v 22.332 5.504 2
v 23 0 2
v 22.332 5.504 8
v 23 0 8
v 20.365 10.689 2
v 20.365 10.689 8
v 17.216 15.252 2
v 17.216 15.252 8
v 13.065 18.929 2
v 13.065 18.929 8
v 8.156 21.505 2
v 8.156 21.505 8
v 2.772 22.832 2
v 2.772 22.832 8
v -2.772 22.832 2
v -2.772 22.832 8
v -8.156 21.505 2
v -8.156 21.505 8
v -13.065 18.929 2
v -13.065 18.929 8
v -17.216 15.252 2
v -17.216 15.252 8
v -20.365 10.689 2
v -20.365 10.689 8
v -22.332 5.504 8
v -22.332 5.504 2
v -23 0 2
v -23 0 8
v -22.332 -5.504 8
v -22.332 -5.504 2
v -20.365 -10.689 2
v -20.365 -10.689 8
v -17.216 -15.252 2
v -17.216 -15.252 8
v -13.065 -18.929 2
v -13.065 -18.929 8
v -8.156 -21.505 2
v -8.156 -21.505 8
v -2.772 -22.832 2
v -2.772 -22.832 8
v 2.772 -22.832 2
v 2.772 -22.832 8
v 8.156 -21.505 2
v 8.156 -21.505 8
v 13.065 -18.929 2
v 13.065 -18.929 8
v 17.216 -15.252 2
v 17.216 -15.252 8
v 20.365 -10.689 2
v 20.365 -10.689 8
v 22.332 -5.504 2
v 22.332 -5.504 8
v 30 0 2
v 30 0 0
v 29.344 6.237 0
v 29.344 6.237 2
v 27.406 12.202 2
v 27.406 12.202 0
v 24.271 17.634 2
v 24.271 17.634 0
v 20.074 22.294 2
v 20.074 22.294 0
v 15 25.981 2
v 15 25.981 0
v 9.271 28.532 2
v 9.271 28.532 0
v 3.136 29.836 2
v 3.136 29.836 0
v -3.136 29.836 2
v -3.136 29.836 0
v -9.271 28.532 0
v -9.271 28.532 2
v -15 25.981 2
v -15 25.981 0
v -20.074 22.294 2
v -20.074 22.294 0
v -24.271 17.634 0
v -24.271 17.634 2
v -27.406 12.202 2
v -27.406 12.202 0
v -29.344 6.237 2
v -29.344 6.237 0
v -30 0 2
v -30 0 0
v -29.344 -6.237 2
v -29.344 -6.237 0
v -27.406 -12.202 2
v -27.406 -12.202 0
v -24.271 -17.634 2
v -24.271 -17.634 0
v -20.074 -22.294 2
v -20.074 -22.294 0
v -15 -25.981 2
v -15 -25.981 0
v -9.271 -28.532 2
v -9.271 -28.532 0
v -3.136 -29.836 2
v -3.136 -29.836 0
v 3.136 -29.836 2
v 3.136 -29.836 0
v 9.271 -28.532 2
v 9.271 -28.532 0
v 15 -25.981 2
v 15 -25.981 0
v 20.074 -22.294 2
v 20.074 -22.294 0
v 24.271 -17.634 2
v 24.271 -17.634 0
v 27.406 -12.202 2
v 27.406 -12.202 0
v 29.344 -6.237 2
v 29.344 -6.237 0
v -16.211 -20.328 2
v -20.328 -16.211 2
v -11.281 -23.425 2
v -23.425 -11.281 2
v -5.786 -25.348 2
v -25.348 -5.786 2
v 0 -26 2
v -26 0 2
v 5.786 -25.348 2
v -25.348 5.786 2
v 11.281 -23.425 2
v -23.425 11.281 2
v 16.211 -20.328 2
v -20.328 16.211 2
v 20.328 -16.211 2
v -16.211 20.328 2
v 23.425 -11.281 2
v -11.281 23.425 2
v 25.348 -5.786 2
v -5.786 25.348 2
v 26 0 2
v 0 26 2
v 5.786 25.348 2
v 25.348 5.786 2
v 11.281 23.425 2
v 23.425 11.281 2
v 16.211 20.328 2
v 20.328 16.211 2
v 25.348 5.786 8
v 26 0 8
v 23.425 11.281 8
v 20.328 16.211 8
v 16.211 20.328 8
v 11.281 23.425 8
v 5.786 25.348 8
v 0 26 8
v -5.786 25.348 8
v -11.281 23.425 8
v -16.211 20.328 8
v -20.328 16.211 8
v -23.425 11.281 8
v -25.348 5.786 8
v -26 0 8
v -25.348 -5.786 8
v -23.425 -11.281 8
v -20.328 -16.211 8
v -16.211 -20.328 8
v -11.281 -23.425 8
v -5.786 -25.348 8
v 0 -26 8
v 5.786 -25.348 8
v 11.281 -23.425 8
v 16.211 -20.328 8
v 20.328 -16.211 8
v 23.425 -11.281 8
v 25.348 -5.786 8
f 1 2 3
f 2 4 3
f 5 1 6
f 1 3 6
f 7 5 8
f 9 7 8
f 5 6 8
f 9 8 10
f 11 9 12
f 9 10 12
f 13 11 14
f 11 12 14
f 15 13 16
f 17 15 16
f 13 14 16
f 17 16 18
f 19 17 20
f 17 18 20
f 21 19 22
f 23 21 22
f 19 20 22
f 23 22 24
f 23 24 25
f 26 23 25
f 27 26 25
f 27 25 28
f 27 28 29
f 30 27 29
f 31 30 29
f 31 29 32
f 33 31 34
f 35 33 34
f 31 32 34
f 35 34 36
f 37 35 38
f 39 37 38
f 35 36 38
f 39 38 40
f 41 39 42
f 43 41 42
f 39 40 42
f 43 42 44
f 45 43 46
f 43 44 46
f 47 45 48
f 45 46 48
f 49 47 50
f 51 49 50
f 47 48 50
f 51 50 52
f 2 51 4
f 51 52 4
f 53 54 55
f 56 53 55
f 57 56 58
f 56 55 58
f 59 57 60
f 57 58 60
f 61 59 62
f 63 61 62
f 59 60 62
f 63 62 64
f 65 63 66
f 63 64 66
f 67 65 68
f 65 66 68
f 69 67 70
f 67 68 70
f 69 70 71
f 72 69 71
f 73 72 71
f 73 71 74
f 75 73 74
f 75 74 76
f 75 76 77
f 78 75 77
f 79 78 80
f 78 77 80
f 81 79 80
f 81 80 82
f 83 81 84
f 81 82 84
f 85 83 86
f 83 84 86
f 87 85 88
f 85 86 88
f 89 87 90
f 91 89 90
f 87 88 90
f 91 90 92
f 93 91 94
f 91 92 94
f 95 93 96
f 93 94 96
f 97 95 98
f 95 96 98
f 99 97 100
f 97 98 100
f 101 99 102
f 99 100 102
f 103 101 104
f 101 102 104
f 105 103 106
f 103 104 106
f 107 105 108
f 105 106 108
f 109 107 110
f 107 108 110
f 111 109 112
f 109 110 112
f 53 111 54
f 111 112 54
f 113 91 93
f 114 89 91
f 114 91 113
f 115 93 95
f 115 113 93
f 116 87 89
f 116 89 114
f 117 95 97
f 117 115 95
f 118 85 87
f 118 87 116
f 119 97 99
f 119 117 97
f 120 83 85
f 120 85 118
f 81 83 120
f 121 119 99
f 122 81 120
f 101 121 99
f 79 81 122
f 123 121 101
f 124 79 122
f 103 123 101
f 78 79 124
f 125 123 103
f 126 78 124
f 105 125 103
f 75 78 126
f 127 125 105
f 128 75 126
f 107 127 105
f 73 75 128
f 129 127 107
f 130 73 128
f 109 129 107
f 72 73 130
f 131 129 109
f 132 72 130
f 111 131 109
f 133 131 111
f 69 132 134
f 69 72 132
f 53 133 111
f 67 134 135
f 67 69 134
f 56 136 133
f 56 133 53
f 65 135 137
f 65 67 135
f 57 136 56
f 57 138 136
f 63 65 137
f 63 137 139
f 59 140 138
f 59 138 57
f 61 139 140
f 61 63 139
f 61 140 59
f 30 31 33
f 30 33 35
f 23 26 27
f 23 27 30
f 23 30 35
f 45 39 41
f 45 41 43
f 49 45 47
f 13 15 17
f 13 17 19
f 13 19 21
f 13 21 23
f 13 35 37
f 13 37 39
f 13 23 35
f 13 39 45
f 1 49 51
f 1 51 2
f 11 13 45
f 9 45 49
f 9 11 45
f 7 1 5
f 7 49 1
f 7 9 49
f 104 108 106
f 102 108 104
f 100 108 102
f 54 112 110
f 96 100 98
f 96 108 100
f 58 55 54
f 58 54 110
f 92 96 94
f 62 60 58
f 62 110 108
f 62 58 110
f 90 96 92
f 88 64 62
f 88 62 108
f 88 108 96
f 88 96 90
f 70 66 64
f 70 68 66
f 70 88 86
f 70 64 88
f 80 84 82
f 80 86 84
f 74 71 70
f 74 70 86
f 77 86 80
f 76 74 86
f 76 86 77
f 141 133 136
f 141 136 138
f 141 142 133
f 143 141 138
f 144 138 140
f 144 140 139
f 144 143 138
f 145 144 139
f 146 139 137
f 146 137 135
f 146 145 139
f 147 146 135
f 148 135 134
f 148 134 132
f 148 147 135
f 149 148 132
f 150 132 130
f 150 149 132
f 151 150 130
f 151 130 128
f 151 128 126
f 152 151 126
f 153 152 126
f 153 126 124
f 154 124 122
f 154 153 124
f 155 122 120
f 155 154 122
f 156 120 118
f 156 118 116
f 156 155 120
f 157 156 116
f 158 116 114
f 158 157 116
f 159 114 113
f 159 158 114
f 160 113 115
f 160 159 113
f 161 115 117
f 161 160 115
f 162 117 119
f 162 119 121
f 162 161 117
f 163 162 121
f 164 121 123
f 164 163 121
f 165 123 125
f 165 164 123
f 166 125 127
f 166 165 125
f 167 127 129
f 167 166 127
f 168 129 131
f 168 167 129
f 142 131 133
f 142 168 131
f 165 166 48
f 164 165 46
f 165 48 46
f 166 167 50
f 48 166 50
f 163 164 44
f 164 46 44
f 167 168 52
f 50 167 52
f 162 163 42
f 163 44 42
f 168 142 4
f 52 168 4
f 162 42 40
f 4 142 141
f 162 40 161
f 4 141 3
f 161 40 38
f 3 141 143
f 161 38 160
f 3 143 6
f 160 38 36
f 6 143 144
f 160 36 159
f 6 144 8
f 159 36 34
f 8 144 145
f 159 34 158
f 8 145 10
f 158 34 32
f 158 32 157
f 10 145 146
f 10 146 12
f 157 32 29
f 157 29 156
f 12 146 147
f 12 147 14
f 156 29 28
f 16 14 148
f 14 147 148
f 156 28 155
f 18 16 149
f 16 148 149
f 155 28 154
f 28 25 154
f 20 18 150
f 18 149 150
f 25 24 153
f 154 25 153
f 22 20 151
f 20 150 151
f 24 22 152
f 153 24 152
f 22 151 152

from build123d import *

# Parameters (mm, degrees)
F0_R     = 30
F1_DEPTH = 2
F2_W     = 3
F2_H     = 8


# Not quite as in the source:
# - the program builds the solid bodies; features that only make, move or delete a surface that nothing else refers to are left out


with BuildPart() as f1:
    # F0 (on Top) → F1 (new body)
    with BuildSketch(Plane.XY):
        Circle(F0_R)
    extrude(amount=F1_DEPTH)

    # F2 (on Front) → F3 (revolve)
    with BuildSketch(Plane.XZ):
        with Locations((24.5, 4)):
            Rectangle(F2_W, F2_H)
    revolve(axis=Axis((0, 0, 15.4871546511), (0, 0, 1)))


solid = f1.part
